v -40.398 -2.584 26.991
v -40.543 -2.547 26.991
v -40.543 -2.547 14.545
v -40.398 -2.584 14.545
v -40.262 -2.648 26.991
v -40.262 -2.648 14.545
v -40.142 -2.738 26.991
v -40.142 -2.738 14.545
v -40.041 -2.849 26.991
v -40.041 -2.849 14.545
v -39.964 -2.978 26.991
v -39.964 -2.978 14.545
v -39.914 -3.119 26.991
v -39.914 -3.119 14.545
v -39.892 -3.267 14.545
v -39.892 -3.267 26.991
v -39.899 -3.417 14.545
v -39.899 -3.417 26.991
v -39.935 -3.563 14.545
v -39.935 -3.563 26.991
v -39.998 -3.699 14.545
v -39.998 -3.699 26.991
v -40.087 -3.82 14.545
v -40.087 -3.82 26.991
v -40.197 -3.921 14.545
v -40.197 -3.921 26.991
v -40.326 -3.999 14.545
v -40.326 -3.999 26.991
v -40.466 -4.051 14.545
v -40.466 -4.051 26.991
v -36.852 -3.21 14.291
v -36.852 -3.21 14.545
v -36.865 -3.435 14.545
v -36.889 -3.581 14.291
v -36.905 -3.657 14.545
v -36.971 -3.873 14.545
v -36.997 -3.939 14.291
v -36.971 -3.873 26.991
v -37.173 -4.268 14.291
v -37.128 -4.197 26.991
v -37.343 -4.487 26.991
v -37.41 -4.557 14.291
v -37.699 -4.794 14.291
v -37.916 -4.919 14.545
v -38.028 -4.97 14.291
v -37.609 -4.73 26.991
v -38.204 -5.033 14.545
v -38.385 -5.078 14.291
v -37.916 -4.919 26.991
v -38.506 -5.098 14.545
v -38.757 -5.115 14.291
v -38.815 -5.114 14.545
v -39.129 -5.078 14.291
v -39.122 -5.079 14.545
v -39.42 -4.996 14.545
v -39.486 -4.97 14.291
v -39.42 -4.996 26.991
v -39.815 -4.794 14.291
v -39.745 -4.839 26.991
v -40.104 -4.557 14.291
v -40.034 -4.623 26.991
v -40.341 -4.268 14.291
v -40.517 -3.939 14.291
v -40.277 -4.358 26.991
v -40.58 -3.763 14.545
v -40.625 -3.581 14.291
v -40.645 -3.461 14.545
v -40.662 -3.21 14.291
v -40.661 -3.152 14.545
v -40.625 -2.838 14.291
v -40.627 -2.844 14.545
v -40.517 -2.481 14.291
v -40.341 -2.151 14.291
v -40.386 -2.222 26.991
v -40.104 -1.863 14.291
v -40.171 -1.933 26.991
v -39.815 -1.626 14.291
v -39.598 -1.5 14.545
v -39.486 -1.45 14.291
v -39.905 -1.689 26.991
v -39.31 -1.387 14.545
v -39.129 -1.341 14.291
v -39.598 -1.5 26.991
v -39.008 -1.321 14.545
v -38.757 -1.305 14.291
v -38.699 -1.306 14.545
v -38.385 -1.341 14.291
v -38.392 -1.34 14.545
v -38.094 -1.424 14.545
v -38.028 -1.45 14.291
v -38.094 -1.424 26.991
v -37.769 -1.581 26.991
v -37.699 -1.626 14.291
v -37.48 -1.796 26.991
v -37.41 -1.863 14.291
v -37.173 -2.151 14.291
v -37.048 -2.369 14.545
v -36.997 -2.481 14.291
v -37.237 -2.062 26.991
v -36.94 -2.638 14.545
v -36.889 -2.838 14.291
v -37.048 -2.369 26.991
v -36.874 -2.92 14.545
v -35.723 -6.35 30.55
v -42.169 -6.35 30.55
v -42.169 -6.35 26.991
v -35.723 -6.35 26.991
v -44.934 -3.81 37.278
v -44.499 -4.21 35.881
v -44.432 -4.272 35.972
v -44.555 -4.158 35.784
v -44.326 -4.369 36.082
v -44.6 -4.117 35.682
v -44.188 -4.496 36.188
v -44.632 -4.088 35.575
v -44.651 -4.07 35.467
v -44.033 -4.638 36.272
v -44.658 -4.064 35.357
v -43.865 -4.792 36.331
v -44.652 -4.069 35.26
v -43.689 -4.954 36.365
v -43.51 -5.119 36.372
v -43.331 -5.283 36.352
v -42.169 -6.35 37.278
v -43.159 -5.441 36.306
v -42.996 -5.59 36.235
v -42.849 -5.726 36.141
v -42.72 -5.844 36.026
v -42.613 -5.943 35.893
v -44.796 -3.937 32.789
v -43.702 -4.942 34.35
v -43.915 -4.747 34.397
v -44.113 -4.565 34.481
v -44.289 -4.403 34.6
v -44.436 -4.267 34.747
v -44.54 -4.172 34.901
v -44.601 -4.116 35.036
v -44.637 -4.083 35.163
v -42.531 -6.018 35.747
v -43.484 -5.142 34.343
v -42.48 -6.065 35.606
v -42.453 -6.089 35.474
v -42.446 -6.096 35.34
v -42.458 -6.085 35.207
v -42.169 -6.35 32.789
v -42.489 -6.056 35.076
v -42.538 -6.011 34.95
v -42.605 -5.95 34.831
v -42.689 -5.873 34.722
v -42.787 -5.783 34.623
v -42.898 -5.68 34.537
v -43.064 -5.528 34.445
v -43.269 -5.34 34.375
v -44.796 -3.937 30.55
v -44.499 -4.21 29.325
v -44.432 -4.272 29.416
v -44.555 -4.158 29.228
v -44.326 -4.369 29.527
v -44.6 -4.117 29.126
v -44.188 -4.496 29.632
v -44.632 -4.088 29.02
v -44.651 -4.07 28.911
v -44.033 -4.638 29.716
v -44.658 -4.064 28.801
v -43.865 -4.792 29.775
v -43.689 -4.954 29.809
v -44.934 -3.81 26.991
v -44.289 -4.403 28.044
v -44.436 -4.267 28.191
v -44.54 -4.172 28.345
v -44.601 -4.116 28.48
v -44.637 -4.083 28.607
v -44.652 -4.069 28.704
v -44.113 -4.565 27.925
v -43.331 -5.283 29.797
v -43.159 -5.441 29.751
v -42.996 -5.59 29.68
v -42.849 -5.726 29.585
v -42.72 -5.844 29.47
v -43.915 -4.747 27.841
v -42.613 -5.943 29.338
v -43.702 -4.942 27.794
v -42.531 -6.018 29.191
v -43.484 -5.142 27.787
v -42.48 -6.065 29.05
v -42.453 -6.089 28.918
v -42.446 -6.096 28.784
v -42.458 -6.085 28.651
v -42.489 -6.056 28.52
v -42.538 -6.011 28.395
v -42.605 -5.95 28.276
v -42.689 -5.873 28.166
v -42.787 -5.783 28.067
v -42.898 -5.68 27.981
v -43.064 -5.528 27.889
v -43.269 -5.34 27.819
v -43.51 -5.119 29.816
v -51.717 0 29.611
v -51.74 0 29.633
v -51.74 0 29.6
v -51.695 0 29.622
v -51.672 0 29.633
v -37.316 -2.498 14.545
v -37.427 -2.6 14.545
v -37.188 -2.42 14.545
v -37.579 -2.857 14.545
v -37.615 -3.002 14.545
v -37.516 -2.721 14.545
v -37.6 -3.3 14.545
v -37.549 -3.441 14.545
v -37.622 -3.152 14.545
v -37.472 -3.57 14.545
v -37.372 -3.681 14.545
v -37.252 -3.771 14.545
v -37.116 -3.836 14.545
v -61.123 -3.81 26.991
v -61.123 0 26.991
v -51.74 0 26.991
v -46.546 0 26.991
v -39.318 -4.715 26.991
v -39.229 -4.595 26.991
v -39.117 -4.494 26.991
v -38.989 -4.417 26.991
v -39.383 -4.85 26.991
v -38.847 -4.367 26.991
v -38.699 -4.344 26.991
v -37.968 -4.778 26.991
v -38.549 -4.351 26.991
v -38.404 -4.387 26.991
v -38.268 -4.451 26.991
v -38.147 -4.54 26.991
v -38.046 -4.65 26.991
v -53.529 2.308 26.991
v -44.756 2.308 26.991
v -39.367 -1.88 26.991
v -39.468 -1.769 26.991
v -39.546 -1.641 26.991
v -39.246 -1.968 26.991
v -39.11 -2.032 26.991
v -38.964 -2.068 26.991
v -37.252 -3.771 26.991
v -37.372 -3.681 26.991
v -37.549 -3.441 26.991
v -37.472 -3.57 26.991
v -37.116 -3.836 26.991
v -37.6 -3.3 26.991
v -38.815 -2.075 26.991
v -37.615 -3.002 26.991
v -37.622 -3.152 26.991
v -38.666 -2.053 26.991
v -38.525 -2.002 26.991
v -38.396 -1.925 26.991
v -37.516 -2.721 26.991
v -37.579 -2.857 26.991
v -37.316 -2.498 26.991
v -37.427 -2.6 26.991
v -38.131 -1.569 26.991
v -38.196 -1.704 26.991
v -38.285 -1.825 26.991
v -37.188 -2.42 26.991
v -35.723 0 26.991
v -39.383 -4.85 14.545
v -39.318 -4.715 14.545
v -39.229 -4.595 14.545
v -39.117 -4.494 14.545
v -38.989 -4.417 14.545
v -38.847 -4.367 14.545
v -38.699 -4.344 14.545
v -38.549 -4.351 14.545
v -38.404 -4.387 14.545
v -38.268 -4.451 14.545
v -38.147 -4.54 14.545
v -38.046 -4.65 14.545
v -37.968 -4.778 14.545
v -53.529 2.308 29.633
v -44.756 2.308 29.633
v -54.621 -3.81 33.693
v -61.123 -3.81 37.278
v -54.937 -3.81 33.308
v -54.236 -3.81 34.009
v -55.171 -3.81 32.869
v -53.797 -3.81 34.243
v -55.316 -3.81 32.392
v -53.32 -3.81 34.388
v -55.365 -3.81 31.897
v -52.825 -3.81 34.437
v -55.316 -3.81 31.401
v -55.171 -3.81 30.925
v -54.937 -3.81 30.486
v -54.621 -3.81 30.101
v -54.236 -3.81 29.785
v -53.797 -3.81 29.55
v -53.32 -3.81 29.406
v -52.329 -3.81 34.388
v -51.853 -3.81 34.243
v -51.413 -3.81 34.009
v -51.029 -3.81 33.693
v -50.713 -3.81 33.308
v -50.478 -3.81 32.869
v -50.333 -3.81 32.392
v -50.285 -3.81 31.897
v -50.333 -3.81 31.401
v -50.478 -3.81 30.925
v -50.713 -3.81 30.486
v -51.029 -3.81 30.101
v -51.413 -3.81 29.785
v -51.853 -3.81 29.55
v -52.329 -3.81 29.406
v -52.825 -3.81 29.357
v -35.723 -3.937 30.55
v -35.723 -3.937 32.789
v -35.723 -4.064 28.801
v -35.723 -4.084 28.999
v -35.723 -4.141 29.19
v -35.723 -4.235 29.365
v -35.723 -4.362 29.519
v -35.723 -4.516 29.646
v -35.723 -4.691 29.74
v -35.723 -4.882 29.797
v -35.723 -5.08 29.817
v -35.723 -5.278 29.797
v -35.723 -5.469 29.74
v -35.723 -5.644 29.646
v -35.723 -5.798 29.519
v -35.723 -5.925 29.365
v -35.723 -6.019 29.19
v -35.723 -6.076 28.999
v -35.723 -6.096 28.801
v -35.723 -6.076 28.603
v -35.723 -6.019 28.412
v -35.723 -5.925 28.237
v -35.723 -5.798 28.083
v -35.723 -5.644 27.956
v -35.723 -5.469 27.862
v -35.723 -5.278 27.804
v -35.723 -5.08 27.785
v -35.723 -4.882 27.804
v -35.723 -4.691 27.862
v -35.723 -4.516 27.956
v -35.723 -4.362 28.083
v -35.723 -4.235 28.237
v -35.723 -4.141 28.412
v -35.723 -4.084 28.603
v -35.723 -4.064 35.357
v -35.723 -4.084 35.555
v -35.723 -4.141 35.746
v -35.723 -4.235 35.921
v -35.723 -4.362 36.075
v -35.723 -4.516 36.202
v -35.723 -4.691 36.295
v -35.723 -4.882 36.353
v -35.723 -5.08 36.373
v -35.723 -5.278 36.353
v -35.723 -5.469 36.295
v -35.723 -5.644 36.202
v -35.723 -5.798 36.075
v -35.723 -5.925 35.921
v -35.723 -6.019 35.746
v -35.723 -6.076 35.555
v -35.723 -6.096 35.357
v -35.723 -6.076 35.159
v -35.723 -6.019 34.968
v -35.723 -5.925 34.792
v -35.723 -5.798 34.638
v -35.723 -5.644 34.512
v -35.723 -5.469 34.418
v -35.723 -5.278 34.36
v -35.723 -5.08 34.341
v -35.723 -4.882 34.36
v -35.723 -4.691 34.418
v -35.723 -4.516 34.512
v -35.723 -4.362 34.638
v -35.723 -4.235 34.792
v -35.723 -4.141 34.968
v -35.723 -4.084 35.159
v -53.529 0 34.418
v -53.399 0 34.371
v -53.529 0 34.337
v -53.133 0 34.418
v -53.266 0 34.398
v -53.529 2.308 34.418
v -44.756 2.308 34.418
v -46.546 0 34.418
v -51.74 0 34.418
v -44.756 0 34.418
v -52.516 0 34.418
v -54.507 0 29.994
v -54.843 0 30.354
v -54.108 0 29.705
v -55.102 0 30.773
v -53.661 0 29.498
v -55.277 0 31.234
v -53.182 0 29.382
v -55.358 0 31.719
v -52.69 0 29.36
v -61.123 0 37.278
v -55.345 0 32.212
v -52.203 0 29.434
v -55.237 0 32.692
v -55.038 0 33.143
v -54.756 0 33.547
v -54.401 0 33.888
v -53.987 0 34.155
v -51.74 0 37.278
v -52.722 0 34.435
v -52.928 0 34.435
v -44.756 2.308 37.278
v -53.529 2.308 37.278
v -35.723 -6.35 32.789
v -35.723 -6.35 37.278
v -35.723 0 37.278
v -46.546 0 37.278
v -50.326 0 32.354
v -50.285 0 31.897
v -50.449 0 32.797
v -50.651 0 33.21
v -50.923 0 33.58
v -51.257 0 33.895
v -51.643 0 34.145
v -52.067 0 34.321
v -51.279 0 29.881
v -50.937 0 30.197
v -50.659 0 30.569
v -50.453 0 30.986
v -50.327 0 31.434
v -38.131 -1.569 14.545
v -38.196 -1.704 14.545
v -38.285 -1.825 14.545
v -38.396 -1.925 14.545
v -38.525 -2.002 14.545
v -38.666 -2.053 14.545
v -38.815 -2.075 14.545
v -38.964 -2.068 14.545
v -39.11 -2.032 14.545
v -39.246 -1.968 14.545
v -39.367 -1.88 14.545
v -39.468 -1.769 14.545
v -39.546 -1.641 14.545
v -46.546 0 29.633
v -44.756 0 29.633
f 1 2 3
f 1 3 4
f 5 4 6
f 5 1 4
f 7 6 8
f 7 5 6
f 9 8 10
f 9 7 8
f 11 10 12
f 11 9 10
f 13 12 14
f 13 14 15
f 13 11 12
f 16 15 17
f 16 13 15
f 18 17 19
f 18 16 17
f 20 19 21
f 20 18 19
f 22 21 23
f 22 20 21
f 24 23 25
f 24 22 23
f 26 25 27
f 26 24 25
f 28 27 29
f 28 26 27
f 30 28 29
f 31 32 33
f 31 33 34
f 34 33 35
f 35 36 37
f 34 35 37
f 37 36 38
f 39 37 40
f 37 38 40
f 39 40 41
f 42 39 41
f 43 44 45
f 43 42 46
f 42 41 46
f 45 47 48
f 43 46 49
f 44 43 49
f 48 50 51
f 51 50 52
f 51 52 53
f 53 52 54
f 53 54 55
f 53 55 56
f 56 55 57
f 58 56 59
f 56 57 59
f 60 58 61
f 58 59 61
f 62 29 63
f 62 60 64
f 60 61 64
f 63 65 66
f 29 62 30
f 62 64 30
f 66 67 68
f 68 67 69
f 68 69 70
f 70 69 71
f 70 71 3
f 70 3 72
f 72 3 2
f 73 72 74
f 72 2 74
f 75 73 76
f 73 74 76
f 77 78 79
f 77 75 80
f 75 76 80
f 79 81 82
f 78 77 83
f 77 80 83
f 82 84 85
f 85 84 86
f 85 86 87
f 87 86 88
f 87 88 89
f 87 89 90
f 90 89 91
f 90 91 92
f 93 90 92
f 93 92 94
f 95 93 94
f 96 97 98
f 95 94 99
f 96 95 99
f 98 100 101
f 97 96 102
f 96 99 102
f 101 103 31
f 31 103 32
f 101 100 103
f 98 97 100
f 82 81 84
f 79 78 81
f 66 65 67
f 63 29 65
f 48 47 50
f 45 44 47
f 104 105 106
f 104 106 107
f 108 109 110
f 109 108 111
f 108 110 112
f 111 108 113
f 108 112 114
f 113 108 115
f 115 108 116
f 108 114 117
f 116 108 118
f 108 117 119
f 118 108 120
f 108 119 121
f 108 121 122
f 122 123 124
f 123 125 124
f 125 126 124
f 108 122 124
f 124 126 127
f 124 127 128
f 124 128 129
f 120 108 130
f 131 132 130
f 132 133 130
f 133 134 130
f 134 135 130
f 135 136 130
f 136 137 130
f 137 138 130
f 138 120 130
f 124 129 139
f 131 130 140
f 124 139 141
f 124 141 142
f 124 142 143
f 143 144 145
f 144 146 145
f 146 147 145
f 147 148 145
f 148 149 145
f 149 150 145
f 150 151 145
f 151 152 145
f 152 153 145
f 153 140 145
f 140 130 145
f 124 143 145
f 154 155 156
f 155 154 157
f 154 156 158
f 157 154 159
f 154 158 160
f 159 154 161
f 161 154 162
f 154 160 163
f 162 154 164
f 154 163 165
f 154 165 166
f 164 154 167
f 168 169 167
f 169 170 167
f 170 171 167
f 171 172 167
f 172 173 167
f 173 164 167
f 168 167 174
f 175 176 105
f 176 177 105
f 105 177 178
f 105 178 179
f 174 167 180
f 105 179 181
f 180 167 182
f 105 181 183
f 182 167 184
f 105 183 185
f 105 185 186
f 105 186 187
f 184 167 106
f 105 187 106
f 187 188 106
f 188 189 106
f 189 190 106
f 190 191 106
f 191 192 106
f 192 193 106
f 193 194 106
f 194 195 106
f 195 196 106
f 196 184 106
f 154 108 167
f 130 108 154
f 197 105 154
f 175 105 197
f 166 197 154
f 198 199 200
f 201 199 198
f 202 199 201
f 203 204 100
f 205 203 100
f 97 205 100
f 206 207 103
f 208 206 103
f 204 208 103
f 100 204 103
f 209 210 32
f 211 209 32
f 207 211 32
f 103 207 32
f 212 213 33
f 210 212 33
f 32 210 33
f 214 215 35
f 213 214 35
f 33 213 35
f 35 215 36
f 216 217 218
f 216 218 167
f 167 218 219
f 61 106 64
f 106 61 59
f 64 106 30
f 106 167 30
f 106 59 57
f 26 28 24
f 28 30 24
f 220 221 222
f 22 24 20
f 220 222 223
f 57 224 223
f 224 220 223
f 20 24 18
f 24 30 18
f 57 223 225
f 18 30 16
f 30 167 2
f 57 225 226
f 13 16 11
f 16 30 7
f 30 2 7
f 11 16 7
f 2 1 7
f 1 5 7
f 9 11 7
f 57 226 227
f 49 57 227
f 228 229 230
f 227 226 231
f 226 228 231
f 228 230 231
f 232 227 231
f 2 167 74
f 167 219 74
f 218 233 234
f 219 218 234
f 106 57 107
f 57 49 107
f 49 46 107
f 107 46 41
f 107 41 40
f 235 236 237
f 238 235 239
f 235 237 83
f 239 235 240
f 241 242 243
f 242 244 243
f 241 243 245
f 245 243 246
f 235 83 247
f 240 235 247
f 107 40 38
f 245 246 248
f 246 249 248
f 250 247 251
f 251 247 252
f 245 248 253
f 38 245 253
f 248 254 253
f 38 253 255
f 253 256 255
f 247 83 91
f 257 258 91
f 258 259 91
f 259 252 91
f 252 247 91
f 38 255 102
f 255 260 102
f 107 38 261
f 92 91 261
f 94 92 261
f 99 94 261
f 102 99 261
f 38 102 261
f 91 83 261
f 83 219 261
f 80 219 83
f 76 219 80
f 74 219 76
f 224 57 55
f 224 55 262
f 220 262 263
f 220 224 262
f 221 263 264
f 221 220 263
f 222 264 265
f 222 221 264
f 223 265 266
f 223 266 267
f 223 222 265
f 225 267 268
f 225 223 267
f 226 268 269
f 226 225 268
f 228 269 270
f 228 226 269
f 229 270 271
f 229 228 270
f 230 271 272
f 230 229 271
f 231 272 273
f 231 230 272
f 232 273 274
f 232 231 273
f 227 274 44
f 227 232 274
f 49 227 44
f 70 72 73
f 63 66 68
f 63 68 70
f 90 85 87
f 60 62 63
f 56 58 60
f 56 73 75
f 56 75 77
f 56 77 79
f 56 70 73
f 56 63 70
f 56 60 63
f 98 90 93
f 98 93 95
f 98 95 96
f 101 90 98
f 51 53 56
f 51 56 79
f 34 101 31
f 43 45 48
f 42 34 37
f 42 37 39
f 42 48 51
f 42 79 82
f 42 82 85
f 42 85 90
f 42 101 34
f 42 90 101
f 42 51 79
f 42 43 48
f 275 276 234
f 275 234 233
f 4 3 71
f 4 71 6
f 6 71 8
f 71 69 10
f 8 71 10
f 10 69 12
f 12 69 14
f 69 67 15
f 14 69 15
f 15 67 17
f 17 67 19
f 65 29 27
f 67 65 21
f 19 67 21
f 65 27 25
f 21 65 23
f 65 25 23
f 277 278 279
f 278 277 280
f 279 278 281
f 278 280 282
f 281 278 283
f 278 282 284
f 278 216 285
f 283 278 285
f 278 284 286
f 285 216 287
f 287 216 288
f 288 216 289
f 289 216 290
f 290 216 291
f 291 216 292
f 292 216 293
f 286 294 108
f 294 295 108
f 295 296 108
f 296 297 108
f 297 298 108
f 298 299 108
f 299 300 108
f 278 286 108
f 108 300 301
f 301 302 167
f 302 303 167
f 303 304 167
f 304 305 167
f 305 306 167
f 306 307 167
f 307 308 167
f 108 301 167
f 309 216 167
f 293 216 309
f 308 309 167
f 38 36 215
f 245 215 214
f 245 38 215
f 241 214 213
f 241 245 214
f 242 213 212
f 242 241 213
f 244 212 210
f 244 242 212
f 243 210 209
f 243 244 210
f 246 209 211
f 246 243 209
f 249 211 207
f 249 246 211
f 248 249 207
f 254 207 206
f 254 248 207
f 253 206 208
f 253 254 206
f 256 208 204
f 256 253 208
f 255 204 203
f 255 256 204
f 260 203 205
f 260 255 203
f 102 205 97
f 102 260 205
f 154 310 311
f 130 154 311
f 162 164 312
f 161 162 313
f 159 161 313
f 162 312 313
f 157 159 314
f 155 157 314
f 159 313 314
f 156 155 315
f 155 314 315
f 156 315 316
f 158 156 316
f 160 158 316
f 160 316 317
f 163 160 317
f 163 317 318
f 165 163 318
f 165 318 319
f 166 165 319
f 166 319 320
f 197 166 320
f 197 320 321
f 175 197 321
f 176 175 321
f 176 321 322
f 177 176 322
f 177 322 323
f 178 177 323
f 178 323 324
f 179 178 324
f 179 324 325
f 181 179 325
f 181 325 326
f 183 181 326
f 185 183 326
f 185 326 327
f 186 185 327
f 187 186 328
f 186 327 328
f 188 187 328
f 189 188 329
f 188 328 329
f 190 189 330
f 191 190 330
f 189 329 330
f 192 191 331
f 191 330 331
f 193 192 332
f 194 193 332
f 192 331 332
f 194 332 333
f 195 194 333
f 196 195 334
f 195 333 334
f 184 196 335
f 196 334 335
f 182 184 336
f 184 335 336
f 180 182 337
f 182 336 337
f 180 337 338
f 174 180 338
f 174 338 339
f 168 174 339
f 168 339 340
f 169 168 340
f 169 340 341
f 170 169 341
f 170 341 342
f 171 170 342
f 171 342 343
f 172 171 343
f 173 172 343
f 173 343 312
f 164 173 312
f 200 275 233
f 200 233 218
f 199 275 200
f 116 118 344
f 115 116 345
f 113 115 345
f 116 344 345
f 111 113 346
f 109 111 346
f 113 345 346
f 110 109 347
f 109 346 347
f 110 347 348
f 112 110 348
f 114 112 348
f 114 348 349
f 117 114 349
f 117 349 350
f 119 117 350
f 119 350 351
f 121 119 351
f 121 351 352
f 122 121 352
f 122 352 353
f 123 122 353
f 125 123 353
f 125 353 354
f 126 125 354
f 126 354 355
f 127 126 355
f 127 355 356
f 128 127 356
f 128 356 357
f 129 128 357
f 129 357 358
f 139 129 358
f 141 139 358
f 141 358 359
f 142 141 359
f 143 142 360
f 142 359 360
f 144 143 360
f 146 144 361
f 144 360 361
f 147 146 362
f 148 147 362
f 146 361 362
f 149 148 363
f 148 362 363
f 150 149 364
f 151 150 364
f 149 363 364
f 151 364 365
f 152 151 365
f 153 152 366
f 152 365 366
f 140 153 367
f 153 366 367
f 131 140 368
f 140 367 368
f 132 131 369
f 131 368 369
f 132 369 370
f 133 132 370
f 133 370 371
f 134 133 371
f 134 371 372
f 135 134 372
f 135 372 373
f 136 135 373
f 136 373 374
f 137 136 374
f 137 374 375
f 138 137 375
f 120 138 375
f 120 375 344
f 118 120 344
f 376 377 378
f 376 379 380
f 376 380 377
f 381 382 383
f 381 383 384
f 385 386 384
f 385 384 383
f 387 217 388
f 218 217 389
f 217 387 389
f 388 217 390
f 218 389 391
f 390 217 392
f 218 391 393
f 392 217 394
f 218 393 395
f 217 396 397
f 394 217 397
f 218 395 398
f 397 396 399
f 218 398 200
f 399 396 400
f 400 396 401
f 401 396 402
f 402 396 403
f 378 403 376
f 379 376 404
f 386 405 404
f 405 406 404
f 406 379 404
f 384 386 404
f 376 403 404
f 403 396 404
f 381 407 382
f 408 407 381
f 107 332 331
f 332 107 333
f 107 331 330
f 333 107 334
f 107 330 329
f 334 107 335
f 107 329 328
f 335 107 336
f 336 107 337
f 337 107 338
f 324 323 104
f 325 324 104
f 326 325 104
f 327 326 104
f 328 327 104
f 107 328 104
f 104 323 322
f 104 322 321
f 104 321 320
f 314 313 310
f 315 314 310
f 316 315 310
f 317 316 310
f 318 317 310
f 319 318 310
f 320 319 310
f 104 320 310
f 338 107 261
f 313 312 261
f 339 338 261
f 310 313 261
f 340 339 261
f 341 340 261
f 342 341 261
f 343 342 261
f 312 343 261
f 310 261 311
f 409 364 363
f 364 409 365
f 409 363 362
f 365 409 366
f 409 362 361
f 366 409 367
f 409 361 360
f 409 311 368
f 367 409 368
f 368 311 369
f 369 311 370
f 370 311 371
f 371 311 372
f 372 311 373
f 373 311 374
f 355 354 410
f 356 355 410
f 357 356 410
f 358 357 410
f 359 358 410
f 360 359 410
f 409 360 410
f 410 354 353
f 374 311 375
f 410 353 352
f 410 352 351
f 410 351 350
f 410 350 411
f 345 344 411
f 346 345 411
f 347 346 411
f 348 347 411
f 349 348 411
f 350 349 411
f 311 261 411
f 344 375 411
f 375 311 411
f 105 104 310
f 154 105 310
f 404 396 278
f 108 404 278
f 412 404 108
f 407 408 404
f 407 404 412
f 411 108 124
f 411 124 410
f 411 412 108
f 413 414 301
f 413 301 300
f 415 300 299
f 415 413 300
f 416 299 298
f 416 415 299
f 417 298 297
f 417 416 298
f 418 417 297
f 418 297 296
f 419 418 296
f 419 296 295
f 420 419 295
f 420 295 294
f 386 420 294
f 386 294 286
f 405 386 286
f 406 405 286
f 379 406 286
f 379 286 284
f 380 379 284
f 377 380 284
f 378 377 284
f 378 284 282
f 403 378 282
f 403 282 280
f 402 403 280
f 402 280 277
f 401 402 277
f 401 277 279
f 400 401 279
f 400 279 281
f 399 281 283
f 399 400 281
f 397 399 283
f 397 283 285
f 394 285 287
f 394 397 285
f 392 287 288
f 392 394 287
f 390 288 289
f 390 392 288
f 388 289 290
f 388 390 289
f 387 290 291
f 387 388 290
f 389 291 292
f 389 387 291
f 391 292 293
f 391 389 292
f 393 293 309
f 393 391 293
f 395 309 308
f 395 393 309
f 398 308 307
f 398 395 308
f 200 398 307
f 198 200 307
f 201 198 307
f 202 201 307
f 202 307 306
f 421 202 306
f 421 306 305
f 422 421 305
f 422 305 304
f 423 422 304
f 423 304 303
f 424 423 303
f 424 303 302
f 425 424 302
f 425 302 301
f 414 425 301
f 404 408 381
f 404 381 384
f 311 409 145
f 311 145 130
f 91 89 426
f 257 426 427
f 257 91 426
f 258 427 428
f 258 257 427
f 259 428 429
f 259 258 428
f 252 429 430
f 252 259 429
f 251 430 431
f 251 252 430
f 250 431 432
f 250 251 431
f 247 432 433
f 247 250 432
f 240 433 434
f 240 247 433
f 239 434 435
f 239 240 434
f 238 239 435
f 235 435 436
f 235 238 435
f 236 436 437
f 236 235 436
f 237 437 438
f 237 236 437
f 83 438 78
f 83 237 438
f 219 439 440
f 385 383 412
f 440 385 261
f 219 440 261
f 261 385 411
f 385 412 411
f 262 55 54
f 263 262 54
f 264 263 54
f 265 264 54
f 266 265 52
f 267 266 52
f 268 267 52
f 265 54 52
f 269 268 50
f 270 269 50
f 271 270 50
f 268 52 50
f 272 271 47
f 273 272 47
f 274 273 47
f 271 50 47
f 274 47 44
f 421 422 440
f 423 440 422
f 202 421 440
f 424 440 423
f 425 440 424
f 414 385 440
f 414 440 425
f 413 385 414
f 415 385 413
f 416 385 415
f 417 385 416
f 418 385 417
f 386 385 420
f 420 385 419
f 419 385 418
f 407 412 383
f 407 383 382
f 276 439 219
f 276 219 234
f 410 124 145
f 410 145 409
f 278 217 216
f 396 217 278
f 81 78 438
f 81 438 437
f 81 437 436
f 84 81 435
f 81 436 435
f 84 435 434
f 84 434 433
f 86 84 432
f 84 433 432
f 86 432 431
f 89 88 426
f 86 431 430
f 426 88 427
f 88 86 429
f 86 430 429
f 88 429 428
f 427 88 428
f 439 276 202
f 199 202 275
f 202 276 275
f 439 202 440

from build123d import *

# Parameters (mm, degrees)
F0_W      = 25.4
F0_H      = 10.287
F0_R      = 2.54
F1_DEPTH  = 6.35
F2_R      = 1.016
F2_W      = 2.413
F2_H      = 2.2386033088
F3_DEPTH  = 25.4
F5_DEPTH  = 25.4
F6_R      = 1.905
F7_DEPTH  = 12.7
F8_R      = 0.7687670518
F9_DEPTH  = 12.446
F11_DEPTH = 10.287
F12_W     = 8.7730400264
F12_H     = 4.7847703099
F13_DEPTH = 2.3083774


with BuildPart() as f1:
    # F0 (on Front) → F1 (new body)
    with BuildSketch(Plane.XZ):
        with Locations((-48.4233582392, 32.1346397566)):
            Rectangle(F0_W, F0_H)
        with Locations((-52.8246313334, 31.8967439234)):
            Circle(F0_R, mode=Mode.SUBTRACT)
    extrude(amount=F1_DEPTH)

    # F2 (on face) → F3 (cut)
    with BuildSketch(Plane.YZ.offset(-35.7233582392)):
        with Locations((-5.08, 28.8009606302)):
            Circle(F2_R)
        with Locations((-5.08, 35.3567898273)):
            Circle(F2_R)
        with Locations((-5.1435, 31.6693251953)):
            Rectangle(F2_W, F2_H)
    extrude(amount=-F3_DEPTH, mode=Mode.SUBTRACT)

    # F4 (on face) → F5 (cut)
    with BuildSketch(Plane(origin=(0, 0, 26.9911397566), x_dir=(1, 0, 0), z_dir=(0, 0, -1))):
        Polygon((-44.9340231717, 3.81), (-42.169496417, 6.35), (-61.1233582392, 6.35), (-61.1233582392, 3.81), align=None)
    extrude(amount=-F5_DEPTH, mode=Mode.SUBTRACT)

    # F6 (on face) → F7 (join)
    with BuildSketch(Plane(origin=(0, 0, 26.9911397566), x_dir=(1, 0, 0), z_dir=(0, 0, -1))):
        with Locations((-38.7569256127, 3.2096616924)):
            Circle(F6_R)
    extrude(amount=F7_DEPTH)

    # F8 (on face) → F9 (cut)
    with BuildSketch(Plane(origin=(0, 0, 26.9911397566), x_dir=(1, 0, 0), z_dir=(0, 0, -1))):
        with Locations((-38.6601233606, 5.1122006076)):
            Circle(F8_R)
        with Locations((-40.6594645279, 3.3064639445)):
            Circle(F8_R)
        with Locations((-38.8537278648, 1.3071227771)):
            Circle(F8_R)
        with Locations((-36.8543866975, 3.1128594402)):
            Circle(F8_R)
    extrude(amount=F9_DEPTH, mode=Mode.SUBTRACT)

    # F10 (on face) → F11 (join)
    with BuildSketch(Plane.XY.offset(37.2781397566)):
        Polygon((-51.73950345, 0), (-46.5462200276, 0), (-44.7563417256, 2.3083709979), (-53.529381752, 2.3083709979), align=None)
    extrude(amount=-F11_DEPTH)

    # F12 (on face) → F13 (cut)
    with BuildSketch(Plane(origin=(0, 2.3083709979, 0), x_dir=(-1, 0, 0), z_dir=(0, 1, 0))):
        with Locations((49.1428617388, 32.0255719125)):
            Rectangle(F12_W, F12_H)
    extrude(amount=-F13_DEPTH, mode=Mode.SUBTRACT)


solid = f1.part
